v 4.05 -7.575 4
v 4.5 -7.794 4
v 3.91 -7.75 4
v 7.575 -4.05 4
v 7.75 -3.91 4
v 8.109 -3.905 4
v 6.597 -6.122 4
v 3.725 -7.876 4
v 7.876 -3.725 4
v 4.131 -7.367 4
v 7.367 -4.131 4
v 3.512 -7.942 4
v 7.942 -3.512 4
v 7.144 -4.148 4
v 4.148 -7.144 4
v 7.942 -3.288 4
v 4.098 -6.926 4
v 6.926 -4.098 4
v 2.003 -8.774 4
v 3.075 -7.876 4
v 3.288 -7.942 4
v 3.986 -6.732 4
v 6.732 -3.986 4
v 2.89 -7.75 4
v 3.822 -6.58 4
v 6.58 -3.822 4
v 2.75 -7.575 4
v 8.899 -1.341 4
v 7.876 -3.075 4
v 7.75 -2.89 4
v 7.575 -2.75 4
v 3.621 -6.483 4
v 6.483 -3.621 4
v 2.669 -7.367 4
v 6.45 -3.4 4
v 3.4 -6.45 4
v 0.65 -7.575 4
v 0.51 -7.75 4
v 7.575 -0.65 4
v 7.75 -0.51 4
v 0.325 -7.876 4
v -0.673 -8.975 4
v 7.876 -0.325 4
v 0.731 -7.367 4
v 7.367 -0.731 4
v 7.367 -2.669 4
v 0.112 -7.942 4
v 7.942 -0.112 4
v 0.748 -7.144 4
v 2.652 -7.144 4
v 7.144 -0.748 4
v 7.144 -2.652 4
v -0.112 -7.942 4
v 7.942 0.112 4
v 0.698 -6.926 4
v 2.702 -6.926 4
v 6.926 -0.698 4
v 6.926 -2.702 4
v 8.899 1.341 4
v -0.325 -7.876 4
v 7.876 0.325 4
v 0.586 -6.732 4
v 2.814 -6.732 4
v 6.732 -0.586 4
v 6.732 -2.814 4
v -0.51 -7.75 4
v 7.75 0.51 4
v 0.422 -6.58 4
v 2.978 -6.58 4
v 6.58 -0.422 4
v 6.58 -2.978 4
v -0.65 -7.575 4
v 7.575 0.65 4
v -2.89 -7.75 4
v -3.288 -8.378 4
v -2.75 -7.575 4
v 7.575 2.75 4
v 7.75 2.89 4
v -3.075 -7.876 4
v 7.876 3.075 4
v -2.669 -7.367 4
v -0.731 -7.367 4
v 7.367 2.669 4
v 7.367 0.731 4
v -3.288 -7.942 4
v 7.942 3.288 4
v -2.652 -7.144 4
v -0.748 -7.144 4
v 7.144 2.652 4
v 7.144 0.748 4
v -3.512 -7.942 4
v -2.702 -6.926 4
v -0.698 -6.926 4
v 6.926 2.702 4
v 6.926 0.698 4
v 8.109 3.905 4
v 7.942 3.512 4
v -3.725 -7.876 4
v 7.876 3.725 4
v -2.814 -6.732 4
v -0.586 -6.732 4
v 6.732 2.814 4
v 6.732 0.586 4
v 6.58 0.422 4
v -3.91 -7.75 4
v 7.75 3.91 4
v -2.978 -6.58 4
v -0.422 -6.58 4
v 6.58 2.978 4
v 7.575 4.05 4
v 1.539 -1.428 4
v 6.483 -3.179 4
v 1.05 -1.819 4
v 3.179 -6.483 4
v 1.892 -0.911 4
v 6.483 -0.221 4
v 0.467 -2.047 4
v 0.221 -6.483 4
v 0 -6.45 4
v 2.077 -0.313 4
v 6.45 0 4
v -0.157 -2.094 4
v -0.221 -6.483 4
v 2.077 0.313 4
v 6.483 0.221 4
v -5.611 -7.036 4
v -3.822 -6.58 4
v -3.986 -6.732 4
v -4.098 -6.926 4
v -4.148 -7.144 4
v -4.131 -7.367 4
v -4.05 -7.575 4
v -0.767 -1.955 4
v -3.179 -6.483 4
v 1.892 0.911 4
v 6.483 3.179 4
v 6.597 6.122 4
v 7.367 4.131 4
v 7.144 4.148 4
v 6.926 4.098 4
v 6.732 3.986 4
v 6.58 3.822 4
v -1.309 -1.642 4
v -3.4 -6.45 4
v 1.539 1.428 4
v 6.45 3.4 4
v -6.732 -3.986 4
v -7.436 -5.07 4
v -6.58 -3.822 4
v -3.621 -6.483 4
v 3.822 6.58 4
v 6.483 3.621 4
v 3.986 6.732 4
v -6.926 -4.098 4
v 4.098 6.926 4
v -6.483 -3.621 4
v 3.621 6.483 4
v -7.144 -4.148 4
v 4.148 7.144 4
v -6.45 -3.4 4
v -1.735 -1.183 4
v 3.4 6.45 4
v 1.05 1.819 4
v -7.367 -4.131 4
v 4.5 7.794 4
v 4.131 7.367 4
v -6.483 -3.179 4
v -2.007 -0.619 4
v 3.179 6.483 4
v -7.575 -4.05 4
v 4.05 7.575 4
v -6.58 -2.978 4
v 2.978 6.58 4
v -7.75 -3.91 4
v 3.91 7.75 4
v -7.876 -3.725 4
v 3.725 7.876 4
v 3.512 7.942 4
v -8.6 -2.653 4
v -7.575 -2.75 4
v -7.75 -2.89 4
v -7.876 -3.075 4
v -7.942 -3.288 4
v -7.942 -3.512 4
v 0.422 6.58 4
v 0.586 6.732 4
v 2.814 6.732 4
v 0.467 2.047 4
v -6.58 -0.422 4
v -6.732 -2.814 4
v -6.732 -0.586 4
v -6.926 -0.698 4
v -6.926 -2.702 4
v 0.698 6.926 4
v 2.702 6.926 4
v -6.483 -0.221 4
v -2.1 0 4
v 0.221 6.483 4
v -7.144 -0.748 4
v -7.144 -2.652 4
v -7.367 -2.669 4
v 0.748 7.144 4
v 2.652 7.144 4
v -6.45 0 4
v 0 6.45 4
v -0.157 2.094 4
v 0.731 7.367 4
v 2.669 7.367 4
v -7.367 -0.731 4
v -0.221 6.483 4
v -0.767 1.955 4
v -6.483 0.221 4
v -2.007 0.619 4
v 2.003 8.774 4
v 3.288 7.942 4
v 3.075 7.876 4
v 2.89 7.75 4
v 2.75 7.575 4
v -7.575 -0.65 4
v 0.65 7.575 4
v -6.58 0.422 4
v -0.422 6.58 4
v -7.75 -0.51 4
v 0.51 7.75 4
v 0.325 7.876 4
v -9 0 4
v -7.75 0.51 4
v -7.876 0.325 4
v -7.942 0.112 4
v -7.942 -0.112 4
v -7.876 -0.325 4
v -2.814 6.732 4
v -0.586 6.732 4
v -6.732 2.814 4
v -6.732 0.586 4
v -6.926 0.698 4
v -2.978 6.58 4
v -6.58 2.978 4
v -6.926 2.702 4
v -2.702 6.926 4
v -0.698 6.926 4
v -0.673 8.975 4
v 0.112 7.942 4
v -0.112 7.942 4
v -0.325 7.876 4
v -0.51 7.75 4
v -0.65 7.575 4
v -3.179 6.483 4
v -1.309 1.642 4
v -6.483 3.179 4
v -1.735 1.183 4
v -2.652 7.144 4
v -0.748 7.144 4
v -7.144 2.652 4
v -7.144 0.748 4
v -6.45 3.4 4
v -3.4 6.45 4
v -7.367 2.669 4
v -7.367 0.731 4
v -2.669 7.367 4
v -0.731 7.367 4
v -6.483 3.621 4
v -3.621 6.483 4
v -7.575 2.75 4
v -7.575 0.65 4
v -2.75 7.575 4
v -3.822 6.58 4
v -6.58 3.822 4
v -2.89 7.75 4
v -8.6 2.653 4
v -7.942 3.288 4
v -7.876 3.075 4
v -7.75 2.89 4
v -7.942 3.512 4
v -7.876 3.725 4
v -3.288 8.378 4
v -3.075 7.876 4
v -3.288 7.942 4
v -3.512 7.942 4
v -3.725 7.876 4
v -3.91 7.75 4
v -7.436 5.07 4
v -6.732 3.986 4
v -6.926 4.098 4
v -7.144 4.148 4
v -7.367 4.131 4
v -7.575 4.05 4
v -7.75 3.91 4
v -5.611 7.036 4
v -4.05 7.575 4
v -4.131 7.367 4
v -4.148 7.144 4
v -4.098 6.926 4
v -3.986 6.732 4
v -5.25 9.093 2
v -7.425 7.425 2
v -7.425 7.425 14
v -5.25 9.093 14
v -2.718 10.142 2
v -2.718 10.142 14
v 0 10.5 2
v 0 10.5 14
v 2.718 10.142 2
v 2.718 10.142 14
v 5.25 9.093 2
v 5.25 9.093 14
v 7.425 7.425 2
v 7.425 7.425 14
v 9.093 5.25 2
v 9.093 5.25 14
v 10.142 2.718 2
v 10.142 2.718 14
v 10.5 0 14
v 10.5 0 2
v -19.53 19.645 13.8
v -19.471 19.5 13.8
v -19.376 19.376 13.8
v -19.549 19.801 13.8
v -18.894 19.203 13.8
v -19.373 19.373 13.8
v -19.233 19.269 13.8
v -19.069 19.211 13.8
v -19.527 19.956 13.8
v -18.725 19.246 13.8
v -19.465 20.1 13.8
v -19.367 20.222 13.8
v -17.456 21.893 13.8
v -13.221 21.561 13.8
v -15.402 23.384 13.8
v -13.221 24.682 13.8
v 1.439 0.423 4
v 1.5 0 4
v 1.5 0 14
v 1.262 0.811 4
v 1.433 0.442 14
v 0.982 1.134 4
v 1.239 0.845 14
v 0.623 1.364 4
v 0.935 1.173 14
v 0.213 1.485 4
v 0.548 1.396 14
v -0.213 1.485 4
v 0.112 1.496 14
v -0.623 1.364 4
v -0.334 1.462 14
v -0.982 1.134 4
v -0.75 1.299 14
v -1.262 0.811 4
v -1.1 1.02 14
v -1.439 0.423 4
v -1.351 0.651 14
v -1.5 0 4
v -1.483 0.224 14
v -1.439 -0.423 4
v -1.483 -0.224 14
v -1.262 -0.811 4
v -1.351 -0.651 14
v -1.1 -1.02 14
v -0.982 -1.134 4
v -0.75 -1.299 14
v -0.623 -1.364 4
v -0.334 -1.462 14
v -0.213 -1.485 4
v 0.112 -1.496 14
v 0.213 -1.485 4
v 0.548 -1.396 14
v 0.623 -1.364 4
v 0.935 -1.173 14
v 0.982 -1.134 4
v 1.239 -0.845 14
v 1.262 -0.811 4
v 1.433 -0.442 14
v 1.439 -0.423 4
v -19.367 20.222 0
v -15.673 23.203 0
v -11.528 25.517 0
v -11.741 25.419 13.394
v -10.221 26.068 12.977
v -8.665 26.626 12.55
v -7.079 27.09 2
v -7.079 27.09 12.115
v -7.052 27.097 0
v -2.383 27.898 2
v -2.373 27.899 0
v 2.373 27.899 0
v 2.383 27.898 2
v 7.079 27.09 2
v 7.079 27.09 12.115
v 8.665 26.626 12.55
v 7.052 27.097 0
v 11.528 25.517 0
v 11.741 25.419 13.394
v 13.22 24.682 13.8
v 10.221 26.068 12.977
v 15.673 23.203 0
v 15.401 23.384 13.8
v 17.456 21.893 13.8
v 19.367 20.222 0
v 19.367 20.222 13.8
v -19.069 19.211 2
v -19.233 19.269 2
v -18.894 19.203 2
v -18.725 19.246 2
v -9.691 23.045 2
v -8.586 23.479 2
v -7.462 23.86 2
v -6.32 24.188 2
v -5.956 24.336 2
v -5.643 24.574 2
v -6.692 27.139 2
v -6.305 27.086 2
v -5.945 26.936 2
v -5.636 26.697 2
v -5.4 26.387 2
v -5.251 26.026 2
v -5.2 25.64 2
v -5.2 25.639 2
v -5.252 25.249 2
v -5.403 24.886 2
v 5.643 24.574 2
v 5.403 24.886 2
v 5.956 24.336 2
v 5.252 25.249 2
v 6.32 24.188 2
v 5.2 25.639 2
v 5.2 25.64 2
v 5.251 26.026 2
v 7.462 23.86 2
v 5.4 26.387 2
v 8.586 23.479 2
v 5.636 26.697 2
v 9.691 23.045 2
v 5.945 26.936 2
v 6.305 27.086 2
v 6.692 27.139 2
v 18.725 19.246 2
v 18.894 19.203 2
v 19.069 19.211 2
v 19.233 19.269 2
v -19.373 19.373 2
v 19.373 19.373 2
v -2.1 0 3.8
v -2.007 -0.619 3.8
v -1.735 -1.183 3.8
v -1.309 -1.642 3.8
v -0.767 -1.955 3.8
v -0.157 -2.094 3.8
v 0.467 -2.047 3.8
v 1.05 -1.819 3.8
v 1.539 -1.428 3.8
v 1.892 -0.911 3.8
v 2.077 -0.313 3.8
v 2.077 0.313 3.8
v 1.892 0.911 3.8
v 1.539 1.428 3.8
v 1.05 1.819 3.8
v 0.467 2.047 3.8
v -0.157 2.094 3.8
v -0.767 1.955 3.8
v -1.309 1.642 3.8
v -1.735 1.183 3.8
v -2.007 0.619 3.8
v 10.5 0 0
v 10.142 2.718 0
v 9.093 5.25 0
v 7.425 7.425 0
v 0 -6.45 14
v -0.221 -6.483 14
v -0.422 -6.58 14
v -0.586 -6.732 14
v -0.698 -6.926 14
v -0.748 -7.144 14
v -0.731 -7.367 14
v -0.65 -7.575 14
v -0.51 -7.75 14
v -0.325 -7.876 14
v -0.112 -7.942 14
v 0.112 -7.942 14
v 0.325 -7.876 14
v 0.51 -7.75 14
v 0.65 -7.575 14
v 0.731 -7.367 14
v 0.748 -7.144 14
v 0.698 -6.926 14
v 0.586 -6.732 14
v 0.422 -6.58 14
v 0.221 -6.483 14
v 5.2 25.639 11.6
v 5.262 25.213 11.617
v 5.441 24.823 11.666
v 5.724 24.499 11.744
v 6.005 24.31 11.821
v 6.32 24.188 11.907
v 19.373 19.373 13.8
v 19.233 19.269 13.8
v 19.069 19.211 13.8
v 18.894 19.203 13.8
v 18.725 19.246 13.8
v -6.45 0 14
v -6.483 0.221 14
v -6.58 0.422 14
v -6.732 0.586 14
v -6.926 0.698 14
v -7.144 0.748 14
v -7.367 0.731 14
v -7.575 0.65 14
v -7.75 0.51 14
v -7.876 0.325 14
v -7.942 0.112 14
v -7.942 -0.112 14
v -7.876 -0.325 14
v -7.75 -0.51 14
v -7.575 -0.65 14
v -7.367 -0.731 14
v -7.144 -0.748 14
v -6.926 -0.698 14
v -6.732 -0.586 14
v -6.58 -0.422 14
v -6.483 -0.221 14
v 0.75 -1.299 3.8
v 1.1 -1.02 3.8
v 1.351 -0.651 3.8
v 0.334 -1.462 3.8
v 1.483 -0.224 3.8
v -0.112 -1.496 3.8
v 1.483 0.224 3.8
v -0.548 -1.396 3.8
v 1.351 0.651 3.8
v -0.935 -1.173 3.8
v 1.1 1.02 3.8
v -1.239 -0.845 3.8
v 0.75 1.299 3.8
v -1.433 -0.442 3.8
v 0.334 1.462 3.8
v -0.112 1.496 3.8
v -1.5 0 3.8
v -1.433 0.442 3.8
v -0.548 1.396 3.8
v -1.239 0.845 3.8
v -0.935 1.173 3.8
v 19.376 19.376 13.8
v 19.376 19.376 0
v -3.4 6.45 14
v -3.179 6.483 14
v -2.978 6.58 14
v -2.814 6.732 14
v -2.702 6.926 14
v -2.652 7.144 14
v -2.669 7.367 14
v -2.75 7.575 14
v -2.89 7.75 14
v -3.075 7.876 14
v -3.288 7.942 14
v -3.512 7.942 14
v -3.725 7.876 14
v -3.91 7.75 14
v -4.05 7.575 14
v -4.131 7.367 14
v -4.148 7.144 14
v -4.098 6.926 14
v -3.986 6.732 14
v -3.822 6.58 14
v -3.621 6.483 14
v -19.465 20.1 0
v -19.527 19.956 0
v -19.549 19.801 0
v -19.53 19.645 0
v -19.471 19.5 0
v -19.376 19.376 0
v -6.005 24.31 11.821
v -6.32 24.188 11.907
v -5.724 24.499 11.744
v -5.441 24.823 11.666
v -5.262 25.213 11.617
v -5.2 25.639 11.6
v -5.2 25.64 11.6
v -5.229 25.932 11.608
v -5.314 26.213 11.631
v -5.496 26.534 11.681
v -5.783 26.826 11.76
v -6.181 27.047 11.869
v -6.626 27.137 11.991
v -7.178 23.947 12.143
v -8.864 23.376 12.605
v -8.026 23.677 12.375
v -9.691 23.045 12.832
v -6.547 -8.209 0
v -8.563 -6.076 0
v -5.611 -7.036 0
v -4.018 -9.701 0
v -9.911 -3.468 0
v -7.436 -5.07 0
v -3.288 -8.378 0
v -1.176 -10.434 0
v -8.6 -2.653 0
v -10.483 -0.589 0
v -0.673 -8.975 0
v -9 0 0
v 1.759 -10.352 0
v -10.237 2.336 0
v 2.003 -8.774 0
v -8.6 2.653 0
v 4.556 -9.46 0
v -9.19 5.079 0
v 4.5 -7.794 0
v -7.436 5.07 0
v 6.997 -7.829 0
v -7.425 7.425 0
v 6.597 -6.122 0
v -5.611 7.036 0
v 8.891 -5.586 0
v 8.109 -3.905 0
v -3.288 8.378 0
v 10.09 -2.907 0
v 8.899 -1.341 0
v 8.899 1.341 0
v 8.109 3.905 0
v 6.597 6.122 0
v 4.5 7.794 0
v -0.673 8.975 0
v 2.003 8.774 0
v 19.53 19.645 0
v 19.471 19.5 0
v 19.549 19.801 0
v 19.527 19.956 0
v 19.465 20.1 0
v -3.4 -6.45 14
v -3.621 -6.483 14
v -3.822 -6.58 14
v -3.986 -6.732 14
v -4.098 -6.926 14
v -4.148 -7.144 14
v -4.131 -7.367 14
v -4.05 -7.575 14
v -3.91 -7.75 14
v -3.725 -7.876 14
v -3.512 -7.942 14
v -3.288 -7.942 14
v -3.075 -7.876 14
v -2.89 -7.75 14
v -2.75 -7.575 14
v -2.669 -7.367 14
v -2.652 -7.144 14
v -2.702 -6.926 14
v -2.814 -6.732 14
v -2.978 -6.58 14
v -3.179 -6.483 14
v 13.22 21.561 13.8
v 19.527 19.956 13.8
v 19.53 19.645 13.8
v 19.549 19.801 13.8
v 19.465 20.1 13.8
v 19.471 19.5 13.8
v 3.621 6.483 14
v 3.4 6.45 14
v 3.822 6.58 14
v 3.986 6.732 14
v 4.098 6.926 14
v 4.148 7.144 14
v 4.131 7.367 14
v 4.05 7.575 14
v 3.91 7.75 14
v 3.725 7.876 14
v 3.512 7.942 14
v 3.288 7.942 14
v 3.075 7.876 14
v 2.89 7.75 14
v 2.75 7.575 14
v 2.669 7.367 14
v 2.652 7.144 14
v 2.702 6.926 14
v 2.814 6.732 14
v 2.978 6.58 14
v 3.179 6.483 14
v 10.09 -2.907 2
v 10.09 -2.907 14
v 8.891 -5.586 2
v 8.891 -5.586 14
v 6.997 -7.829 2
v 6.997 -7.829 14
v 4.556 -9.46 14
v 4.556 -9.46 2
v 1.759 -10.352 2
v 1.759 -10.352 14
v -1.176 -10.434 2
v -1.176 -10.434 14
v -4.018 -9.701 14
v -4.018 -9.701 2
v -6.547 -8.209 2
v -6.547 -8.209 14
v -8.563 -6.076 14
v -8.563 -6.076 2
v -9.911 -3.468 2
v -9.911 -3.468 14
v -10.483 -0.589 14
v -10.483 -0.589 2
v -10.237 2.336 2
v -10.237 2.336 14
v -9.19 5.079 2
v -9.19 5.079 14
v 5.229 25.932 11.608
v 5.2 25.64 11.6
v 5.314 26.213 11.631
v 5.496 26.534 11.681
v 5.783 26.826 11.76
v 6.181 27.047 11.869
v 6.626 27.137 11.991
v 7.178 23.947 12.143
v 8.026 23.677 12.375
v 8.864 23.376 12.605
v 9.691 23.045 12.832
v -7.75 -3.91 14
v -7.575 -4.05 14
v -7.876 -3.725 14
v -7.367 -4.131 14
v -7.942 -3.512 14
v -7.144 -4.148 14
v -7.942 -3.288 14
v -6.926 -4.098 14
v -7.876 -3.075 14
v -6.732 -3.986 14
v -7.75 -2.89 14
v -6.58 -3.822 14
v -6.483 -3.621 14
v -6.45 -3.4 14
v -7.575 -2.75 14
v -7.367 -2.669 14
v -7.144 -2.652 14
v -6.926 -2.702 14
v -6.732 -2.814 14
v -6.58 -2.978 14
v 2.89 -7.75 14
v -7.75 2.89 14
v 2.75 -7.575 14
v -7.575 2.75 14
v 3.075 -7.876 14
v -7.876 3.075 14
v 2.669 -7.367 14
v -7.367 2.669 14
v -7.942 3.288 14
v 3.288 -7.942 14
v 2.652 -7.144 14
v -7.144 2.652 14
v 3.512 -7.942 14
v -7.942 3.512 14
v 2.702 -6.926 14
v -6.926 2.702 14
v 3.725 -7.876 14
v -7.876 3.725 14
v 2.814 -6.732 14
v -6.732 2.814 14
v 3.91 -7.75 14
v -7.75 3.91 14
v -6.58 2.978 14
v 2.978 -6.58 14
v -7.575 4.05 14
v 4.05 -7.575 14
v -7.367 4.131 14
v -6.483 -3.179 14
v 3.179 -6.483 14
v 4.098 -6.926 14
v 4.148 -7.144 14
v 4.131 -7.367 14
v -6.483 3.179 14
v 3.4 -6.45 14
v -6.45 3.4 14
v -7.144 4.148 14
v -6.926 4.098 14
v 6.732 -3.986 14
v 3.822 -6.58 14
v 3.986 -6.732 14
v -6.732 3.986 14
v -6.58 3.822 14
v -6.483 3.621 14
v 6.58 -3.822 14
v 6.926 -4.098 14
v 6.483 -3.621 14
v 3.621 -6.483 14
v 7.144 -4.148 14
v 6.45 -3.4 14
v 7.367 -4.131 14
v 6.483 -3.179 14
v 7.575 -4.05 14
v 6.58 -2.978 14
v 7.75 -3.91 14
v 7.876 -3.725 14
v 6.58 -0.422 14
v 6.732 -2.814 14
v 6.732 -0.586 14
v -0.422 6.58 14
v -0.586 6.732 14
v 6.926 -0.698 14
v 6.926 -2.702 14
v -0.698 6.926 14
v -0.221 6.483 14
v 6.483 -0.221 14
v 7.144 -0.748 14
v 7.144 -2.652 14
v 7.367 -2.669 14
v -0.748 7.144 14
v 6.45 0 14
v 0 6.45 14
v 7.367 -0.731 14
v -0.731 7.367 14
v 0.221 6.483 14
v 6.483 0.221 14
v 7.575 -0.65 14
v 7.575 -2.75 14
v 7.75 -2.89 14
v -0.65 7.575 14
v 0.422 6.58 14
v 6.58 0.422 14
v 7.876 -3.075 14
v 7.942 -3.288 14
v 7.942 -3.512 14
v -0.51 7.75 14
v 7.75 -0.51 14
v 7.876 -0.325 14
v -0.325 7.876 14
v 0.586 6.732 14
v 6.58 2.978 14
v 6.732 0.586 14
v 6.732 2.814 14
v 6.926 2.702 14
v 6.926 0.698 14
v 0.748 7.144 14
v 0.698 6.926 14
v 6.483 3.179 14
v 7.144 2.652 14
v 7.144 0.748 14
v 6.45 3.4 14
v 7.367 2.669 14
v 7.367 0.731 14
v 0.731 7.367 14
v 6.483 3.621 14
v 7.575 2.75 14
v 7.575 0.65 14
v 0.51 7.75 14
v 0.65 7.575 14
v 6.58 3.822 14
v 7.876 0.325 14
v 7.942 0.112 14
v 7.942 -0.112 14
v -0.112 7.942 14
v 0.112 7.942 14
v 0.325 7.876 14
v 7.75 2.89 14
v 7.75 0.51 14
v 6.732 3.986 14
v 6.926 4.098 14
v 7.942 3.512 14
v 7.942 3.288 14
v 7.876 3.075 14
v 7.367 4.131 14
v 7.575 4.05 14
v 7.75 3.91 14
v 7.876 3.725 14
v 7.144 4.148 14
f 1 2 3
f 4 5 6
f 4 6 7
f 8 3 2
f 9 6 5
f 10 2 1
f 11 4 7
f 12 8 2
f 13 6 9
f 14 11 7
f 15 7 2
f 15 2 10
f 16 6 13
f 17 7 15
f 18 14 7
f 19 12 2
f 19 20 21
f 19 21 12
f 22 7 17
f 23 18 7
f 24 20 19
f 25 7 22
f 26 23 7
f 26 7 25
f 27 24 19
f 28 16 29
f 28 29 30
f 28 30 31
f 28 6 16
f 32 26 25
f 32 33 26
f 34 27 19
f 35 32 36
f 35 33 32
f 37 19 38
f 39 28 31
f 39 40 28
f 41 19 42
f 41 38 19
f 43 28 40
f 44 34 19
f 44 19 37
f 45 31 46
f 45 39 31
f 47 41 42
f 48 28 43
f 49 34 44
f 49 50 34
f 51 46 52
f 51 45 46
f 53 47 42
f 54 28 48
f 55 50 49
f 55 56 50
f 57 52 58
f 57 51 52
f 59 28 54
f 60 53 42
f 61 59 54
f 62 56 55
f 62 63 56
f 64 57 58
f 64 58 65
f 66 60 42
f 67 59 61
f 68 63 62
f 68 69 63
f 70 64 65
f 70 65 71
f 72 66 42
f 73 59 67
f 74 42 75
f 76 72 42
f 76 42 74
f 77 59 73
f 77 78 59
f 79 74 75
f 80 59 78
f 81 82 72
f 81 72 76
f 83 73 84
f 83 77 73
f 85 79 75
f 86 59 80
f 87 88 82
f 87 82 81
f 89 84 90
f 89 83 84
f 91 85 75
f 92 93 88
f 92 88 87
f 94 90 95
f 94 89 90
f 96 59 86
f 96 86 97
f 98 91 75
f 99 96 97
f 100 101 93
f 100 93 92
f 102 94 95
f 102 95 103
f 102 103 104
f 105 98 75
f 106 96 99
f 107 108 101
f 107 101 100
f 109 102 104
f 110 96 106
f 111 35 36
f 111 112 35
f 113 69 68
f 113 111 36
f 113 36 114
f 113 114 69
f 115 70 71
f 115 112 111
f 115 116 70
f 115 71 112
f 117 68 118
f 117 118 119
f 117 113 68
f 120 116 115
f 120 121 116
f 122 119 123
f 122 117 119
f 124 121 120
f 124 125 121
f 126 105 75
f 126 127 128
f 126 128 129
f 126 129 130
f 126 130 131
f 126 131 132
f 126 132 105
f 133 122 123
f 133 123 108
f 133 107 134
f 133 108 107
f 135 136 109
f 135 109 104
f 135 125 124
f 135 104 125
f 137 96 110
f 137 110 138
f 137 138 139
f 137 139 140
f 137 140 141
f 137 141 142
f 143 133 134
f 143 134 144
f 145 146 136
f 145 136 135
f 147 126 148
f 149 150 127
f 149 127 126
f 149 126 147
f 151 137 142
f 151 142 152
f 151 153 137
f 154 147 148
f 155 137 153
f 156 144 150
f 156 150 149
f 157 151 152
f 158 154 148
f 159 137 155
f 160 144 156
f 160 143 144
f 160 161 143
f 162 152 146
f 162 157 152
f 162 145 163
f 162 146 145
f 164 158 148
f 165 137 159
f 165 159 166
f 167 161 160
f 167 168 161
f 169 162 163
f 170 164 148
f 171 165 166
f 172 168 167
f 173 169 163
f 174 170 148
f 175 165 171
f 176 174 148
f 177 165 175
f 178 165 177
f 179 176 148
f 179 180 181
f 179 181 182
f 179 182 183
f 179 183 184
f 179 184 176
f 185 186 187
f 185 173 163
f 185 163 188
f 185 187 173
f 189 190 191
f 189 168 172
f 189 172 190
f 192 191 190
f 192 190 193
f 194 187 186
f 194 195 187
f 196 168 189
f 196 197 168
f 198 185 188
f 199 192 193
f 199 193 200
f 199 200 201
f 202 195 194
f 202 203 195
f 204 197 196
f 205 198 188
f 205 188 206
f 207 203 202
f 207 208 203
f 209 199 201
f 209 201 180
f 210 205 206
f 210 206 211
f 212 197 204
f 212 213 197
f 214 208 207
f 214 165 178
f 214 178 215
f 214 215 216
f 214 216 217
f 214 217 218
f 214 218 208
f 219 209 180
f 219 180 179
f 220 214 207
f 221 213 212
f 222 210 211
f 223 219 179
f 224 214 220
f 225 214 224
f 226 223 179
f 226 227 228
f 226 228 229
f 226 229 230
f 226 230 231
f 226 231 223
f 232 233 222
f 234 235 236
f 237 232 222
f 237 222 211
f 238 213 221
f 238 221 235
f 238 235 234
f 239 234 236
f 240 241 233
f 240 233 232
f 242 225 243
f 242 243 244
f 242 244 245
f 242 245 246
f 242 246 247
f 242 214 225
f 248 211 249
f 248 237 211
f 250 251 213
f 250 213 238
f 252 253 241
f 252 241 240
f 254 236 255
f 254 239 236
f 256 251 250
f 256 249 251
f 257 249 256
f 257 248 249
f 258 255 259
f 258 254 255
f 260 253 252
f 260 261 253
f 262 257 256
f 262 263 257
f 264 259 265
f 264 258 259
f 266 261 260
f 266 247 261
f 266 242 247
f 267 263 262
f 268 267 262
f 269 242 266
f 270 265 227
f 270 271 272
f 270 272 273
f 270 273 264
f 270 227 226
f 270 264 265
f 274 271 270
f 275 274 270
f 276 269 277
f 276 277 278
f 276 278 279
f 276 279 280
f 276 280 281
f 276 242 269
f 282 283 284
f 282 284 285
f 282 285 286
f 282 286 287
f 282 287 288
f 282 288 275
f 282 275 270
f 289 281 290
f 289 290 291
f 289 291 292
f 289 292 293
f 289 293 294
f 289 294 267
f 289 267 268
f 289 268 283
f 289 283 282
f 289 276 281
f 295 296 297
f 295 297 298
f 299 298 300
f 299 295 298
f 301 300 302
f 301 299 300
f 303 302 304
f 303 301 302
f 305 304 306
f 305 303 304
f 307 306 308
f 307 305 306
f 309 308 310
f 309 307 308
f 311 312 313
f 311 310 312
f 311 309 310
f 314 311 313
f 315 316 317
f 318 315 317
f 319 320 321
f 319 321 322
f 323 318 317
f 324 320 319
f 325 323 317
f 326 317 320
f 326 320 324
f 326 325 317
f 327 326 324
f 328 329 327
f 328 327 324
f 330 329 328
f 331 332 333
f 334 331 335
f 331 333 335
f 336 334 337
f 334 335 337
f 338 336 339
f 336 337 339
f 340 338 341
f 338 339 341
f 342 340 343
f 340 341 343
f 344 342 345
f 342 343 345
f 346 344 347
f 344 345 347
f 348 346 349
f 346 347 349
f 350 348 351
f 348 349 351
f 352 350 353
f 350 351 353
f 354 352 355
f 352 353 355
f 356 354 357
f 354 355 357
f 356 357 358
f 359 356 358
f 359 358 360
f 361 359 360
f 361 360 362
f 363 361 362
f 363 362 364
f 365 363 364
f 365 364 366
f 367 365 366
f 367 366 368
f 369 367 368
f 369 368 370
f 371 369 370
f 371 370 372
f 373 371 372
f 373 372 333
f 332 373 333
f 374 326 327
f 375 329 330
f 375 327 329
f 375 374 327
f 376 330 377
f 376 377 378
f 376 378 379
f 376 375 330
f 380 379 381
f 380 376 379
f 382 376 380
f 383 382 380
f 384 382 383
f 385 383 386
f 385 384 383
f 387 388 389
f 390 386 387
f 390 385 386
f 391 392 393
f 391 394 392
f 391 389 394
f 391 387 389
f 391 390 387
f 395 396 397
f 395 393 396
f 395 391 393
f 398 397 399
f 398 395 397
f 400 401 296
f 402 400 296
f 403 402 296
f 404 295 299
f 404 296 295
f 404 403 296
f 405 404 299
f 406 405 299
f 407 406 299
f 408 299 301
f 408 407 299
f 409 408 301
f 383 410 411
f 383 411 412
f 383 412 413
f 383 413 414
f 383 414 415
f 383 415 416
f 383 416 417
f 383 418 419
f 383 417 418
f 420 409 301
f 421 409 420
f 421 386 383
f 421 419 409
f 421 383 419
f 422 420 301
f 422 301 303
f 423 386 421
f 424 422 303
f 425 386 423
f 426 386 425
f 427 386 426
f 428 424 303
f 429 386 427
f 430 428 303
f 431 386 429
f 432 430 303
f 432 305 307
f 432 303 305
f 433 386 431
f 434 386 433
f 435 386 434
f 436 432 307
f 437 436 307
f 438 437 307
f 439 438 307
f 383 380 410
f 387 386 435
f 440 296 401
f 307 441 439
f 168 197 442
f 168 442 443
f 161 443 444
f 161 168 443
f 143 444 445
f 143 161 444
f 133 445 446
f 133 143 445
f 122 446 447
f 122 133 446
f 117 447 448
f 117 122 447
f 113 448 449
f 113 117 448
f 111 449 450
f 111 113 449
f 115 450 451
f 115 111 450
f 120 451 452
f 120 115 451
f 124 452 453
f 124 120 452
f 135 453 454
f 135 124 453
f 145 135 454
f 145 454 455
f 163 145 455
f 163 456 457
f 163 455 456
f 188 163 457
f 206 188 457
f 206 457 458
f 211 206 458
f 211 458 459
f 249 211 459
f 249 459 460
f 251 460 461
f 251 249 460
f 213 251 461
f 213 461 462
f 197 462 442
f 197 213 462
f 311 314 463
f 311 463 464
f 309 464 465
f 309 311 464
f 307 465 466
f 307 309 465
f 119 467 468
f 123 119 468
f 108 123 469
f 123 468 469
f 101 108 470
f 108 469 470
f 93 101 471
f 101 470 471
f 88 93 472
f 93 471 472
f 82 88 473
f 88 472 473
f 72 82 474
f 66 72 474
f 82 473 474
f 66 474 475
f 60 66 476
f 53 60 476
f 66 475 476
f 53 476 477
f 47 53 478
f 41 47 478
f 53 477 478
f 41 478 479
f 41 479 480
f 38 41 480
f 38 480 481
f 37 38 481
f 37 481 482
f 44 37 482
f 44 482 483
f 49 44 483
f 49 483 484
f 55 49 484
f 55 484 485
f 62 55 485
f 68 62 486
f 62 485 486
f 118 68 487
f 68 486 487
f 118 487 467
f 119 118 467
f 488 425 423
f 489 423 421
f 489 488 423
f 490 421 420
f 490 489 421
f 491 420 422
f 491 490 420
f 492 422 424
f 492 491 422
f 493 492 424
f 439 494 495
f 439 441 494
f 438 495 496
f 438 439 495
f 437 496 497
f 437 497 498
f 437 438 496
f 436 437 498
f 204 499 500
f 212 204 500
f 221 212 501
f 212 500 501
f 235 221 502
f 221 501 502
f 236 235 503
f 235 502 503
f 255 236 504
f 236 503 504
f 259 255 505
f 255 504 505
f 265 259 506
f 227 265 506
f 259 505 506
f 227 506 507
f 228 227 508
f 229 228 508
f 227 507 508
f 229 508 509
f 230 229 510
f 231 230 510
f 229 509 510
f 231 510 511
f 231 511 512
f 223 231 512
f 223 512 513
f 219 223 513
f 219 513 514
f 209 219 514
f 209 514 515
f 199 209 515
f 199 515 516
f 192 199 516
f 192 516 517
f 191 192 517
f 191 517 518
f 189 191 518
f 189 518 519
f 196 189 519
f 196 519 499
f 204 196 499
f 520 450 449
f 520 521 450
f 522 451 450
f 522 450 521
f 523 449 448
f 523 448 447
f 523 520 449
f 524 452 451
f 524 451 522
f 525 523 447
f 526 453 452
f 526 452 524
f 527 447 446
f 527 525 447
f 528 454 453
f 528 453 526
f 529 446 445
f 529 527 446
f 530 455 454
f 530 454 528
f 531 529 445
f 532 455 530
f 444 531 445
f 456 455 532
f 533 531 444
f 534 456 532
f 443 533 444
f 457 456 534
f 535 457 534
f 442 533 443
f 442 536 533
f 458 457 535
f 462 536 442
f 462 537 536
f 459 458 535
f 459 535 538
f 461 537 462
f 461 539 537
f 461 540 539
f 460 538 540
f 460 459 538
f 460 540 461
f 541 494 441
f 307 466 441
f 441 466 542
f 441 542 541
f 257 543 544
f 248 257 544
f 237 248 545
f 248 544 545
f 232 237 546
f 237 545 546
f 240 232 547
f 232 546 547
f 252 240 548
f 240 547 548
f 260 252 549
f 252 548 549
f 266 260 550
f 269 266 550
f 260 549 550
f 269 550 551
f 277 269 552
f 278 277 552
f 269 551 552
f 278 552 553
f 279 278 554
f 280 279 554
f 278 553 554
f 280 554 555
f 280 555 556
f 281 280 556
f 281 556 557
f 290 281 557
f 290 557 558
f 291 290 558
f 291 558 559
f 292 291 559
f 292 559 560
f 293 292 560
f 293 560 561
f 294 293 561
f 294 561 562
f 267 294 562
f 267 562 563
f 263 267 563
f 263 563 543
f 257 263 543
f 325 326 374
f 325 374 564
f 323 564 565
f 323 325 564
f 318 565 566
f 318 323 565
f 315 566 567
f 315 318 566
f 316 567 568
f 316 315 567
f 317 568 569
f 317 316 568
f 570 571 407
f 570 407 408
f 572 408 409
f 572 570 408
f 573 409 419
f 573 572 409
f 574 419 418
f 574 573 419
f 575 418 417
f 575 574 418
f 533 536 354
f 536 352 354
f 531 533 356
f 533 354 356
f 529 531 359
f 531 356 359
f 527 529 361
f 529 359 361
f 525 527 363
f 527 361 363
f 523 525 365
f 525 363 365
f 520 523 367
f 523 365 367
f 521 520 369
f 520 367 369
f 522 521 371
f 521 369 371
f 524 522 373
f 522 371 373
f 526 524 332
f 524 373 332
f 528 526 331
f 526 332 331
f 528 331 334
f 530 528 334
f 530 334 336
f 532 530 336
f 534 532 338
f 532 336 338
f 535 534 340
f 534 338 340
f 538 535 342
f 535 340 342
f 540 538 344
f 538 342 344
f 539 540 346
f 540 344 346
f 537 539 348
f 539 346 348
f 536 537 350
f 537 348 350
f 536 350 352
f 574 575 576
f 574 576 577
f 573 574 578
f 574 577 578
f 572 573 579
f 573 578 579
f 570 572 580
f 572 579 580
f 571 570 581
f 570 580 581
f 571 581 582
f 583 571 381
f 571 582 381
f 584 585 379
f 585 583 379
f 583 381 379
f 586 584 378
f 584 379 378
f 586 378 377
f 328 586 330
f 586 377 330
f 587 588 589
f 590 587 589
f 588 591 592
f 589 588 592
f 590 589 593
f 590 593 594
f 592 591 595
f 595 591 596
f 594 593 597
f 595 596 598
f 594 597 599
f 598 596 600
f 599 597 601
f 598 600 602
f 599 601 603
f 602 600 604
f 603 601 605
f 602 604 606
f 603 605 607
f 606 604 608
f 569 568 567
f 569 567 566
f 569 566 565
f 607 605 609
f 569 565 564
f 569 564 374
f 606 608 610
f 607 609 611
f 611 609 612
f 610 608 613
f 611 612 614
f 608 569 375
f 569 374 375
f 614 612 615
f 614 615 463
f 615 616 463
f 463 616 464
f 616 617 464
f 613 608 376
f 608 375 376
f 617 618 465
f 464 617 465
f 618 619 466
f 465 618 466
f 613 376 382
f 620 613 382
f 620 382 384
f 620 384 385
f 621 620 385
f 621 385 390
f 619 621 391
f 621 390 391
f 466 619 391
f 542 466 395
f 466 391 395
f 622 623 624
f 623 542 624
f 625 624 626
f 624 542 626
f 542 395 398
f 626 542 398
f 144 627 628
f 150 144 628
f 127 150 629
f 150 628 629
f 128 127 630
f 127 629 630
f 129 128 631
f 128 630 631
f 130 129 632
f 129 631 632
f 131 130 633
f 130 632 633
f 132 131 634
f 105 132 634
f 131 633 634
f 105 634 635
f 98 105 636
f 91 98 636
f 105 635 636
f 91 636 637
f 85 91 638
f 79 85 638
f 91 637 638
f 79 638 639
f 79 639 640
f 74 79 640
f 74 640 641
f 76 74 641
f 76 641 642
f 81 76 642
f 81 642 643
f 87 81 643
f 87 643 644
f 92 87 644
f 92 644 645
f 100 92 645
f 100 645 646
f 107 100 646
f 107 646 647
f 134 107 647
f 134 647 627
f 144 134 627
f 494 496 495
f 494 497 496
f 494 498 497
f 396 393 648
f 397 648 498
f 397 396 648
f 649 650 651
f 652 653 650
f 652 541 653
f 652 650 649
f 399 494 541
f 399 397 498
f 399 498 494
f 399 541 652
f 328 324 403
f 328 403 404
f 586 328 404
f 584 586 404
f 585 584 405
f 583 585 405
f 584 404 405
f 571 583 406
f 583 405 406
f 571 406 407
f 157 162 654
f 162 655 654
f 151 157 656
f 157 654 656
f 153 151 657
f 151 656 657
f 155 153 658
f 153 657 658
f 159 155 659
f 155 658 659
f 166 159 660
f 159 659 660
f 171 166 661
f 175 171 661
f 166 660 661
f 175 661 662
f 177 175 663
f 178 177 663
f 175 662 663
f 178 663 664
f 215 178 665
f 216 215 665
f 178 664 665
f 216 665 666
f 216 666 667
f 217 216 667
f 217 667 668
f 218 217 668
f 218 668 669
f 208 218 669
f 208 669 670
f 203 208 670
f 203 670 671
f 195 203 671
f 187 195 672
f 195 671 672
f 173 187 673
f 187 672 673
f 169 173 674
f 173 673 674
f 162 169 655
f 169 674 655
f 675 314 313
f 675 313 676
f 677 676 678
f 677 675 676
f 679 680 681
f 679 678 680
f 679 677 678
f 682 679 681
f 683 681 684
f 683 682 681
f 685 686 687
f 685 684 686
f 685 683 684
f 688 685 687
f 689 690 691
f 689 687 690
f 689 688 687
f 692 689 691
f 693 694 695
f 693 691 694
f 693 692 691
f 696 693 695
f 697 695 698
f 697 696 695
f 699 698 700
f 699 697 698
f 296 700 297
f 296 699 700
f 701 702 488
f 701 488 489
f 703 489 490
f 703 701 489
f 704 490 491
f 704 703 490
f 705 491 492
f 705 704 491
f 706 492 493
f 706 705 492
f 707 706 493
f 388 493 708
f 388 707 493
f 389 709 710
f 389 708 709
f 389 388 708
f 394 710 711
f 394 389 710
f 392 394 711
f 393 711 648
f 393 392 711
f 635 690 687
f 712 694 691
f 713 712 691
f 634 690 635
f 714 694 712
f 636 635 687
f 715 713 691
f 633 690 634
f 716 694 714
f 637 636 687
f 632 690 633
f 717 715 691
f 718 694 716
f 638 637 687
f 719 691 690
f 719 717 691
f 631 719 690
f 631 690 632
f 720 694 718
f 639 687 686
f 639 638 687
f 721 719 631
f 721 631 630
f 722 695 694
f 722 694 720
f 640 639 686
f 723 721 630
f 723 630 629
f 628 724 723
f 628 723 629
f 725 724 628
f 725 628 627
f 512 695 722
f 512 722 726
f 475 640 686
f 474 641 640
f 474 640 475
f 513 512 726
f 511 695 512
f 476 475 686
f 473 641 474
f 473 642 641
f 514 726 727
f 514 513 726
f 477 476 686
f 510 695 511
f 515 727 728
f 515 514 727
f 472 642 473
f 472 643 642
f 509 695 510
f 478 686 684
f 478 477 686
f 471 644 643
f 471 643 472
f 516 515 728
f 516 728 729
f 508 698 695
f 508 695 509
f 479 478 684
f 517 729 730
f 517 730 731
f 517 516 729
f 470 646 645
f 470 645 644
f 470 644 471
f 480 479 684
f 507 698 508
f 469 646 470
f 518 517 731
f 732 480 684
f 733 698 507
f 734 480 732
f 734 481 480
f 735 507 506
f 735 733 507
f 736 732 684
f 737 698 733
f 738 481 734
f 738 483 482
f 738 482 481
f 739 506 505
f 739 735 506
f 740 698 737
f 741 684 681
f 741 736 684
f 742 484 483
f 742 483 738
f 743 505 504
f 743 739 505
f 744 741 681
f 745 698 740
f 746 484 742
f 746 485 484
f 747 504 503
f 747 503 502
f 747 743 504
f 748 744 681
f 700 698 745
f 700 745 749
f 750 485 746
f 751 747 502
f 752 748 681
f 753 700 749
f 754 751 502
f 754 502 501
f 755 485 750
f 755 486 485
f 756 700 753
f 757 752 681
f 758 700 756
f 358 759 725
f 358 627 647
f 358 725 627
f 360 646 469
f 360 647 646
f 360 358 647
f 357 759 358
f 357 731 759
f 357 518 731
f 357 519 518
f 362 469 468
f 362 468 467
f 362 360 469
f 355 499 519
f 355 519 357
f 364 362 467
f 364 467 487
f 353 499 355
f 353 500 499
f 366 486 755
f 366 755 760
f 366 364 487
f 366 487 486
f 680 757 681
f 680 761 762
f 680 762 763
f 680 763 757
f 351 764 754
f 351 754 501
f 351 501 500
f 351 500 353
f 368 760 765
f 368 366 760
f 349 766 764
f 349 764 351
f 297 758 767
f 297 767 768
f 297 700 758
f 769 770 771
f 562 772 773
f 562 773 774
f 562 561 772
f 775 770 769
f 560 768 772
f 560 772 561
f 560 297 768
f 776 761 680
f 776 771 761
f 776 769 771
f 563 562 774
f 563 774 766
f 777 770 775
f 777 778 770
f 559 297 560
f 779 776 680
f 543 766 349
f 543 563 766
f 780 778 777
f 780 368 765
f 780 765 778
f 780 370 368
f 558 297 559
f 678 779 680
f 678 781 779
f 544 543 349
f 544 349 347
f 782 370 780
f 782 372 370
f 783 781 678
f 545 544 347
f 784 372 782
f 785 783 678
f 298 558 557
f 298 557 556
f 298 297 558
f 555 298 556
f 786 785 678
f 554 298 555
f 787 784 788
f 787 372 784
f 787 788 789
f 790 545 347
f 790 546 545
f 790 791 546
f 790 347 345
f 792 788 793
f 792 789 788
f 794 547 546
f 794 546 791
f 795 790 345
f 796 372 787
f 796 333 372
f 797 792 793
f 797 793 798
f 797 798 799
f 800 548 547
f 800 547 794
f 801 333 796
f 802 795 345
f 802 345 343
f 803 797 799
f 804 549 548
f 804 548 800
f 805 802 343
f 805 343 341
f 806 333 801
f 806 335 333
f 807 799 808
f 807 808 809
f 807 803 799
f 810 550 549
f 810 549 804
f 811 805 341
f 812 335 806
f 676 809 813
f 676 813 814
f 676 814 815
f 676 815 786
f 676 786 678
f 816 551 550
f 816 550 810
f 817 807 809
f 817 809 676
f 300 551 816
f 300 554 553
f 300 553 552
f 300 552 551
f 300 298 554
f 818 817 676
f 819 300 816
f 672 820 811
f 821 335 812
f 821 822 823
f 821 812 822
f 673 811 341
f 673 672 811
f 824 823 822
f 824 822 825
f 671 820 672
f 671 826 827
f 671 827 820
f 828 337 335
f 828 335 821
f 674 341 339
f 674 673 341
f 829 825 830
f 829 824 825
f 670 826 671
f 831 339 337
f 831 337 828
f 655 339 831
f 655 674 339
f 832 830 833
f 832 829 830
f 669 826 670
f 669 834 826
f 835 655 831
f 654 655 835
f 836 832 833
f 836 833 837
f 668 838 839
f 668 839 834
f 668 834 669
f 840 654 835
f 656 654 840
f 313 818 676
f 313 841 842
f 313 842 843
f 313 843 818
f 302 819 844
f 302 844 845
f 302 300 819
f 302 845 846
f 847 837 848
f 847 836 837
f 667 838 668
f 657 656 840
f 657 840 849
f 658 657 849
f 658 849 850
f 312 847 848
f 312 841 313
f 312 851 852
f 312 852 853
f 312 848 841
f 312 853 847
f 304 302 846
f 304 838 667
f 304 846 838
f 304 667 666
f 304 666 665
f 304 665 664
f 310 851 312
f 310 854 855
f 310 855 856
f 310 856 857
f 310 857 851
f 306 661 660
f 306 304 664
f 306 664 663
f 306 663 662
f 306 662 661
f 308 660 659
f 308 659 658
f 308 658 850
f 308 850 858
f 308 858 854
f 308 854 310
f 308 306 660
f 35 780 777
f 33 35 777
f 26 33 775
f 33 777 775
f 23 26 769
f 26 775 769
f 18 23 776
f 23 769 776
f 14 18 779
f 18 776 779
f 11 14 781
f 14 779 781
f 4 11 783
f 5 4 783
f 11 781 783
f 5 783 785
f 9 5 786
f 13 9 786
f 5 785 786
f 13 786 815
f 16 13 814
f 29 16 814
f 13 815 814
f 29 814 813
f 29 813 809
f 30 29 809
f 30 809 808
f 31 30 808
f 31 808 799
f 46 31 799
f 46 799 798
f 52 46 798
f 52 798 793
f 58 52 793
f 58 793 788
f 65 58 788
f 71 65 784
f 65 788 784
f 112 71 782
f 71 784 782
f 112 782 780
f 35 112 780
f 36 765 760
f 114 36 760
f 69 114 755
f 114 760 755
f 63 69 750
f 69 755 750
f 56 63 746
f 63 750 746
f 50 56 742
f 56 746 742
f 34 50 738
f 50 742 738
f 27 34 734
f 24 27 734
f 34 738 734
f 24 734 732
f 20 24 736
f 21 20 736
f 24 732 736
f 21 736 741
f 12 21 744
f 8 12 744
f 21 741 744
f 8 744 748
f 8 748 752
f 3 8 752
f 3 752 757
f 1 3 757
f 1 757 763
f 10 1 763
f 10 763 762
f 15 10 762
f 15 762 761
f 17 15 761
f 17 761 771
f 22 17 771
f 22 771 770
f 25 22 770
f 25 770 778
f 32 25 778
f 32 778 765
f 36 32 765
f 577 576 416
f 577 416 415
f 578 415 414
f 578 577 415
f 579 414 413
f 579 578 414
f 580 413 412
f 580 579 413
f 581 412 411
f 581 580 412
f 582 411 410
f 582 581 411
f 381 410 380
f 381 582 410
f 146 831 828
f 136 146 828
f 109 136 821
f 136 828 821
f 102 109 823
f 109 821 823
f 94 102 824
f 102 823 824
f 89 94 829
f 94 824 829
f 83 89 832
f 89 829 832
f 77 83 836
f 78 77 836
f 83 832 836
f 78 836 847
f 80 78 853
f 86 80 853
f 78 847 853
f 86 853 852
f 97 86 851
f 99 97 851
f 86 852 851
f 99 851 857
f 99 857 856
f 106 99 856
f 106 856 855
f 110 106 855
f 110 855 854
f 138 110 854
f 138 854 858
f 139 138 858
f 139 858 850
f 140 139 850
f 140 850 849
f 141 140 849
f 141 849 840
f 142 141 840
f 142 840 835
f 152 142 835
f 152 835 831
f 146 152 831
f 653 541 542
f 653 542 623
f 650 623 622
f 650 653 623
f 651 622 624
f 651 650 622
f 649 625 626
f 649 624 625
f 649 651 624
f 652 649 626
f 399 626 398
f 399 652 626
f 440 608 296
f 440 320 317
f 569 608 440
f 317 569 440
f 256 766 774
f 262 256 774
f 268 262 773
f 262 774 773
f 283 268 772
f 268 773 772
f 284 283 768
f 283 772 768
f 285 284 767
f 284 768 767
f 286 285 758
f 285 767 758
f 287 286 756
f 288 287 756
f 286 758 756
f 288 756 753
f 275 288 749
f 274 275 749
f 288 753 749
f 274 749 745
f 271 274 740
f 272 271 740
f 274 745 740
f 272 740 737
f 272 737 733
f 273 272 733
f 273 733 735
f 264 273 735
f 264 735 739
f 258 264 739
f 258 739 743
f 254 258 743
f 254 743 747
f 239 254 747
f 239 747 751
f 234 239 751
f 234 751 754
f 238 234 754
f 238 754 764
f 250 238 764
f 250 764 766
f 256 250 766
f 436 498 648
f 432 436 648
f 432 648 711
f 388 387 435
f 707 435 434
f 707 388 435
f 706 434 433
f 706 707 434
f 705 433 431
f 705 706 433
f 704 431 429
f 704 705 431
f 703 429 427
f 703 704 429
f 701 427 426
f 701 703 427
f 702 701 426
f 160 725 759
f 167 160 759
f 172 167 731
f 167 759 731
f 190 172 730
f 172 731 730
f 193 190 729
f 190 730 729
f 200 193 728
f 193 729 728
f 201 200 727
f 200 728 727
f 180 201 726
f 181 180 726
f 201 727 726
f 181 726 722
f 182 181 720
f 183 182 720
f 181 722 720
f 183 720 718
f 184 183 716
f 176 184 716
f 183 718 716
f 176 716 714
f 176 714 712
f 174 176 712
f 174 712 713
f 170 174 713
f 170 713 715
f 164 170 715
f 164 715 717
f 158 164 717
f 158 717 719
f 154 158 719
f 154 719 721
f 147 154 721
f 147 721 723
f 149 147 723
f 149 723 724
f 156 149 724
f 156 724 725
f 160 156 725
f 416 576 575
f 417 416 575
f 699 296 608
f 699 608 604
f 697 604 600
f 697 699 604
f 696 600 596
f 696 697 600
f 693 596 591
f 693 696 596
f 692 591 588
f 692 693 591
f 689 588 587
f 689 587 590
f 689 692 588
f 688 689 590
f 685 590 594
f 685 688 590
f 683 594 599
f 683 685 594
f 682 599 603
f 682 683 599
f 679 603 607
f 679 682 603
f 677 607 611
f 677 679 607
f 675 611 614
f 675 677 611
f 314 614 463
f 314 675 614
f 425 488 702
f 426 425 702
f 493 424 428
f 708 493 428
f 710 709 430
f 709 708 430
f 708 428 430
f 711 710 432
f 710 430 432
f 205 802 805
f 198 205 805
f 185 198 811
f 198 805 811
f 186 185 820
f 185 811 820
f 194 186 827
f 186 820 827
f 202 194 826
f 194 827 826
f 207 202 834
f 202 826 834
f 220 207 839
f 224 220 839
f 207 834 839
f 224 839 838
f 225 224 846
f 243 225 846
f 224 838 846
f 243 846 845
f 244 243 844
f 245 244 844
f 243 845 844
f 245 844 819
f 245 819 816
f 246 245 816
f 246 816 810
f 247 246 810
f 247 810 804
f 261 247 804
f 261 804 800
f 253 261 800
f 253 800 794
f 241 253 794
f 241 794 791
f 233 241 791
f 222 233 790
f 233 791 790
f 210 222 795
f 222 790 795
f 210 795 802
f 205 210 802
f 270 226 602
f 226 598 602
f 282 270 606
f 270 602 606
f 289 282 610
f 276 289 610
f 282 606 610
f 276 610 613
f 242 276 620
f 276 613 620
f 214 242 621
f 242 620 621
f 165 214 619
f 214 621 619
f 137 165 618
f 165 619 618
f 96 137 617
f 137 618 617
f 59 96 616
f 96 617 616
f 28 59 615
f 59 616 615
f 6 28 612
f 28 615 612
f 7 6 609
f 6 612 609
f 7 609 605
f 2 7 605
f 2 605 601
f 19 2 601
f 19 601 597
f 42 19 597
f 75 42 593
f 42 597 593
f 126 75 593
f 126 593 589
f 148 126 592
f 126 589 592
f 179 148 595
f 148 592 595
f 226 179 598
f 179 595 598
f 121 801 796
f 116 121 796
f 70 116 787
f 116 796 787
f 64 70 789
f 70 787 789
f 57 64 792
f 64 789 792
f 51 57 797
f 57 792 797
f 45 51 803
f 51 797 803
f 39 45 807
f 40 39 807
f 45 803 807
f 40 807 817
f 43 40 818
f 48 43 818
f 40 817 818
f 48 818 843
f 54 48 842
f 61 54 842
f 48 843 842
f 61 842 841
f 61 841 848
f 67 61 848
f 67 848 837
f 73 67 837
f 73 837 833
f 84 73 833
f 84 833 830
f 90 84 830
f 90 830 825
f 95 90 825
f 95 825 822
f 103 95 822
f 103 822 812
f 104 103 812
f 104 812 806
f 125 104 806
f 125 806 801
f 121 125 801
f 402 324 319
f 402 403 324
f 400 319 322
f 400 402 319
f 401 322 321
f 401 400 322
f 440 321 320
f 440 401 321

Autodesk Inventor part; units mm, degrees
ref_plane "YZ Plane" through (0, 0, 0) normal (1, 0, 0) x (0, 1, 0)
ref_plane "XZ Plane" through (0, 0, 0) normal (0, 1, 0) x (-1, 0, 0)
ref_plane "XY Plane" through (0, 0, 0) normal (0, 0, 1) x (1, 0, 0)
sketch "Эскиз1" plane through (0, 0, 0) normal (0, 0, 1) x (1, 0, 0)
  circle A0 centre (0, 0) radius 30
  circle A1 centre (0, 0) radius 25
  circle A2 centre (0, 0) radius 28
  line L0 (0, 0) -> (28, 0) construction
  line L1 (0, 0) -> (28, 0) construction
  line L2 (0, 28) -> (-5.2, 28)
  line L3 (-5.2, 28) -> (-5.2, 24.4532)
  line L4 (0, 0) -> (19.799, 19.799)
  line L5 (0, 0) -> (28, 0) construction
  line L6 (-0.4901, 1.1812) -> (26.3238, 1.1812) construction
  line L7 (0, 0) -> (-19.799, 19.799)
  line L8 (0, 0) -> (28, 0) construction
  line L9 (-5.2, 24.4532) -> (5.2, 24.4532)
  line L10 (5.2, 24.4532) -> (5.2, 28)
  line L11 (5.2, 28) -> (0, 28)
  point P0 (4.9999, 24.4949)
  point P1 (-19.4504, 20.1415)
  point P2 (-5.2, 27.5129)
  dimension "d0" = 60
  dimension "d1" = 50
  dimension "d2" = 56
  dimension "d5" = 5.2
  dimension "d7" = 45
  dimension "d11" = 135
  dimension "d19" = 10.4
extrude "Выдавливание1" add sketch "Эскиз1" along normal blind 2 contours L9 A1 | L10 A2 L4 A1 | A1 L4 L7 L9 | A1 L3 A2 L10 | A1 L7 A2 L3
sketch "Эскиз2" plane through (0, 0, 2) normal (0, 0, 1) x (1, 0, 0)
  line L0 (-19.799, 19.799) -> (0, 0) projected
  circle A0 centre (0, 0) radius 25
  line L1 (-5.2, 28) -> (-5.2, 27.5129) projected
  circle A1 centre (0, 0) radius 28
  arc A2 (19.799, 19.799) -> (-19.799, 19.799) centre (0, 0) ccw projected
  line L2 (-5.2, 27.5129) -> (-5.2, 24.4532)
  line L3 (0, 0) -> (19.799, 19.799) projected
  line L4 (19.799, 19.799) -> (17.6777, 17.6777)
  line L5 (-19.799, 19.799) -> (-17.6777, 17.6777)
  line L6 (-5.2, 24.4532) -> (5.2, 24.4532)
  line L7 (5.2, 24.4532) -> (5.2, 27.5129)
  point P0 (4.9999, 24.4949)
  point P1 (4.9874, 27.5522)
  point P2 (0, 28)
  dimension "d20" = 10.4
extrude "Выдавливание2" add sketch "Эскиз2" along normal blind 11.8 contours A1 L2 A0 L0 | A1 L3 A0 L7
fillet "Сопряжение1" radius 1.5 4 edges at (5.2, 27.5129, 7.9) (5.2, 24.4532, 7.9) (-5.2, 27.5129, 7.9) (-5.2, 24.4532, 7.9)
sketch "Эскиз4" plane through (0, 0, 2) normal (0, 0, 1) x (1, 0, 0)
  line L0 (-17.6777, 17.6777) -> (0, 0) projected
  circle A0 centre (0, 0) radius 10.5
  dimension "d25" = 21
extrude "Выдавливание3" add sketch "Эскиз4" along normal blind 12 and the other way blind 2
sketch "Эскиз3" plane through (0, 0, 2) normal (0, 0, 1) x (1, 0, 0)
  line L0 (0, 28) -> (0, 29)
  line L1 (0, 29) -> (-5, 29)
  line L2 (-5, 29) -> (-5, 19)
  line L3 (-5, 19) -> (5, 19)
  line L4 (0, 29) -> (5, 29)
  line L5 (5, 29) -> (5, 19)
  line L6 (-1.7678, 18.2322) -> (-10, 10)
  line L7 (-19.799, 19.799) -> (-7.4246, 7.4246) projected
  line L8 (1.7678, 18.2322) -> (10, 10)
  line L9 (7.4246, 7.4246) -> (17.6777, 17.6777) projected
  line L10 (10, 10) -> (7.8787, 7.8787)
  circle A0 centre (0, 0) radius 11.1421
  line L11 (-10, 10) -> (-7.8787, 7.8787)
  arc A1 (1.7678, 18.2322) -> (-1.7678, 18.2322) centre (0, 16.4645) ccw
  line L12 (-10, 10) -> (-2.9289, 17.0711)
  line L13 (-2.9289, 17.0711) -> (-10, 24.1421)
  line L14 (-10, 24.1421) -> (-17.0711, 17.0711)
  line L15 (-10, 10) -> (-17.0711, 17.0711)
  line L16 (-7.4246, 7.4246) -> (0, 0)
  arc A2 (7.4246, 7.4246) -> (-7.4246, 7.4246) centre (0, 0) ccw projected
  line L17 (0, 0) -> (7.4246, 7.4246)
  circle A3 centre (0, 0) radius 28
  circle A4 centre (0, 0) radius 25
  line L18 (0, 11.1421) -> (0, 35.3553)
  line L19 (10, 10) -> (27.088, -7.088)
  line L20 (-10, 10) -> (-27.088, -7.088)
  line L21 (27.088, -7.088) -> (-27.088, -7.088)
  line L22 (-17.0711, 17.0711) -> (-21.6622, 12.4799)
  line L23 (-21.6622, 12.4799) -> (-27.1, 7.0422)
  line L24 (10, 10) -> (17.0711, 17.0711)
  line L25 (17.0711, 17.0711) -> (21.6622, 12.4799)
  line L26 (21.6622, 12.4799) -> (12.4799, 21.6622)
  arc A5 (17.6777, 17.6777) -> (6.3208, 24.1878) centre (0, 0) ccw projected
  dimension "d21" = 1
  dimension "d22" = 5
  dimension "d23" = 10
  dimension "d24" = 10
  dimension "d31" = 3
  dimension "d32" = 2.5
  dimension "d33" = 10
  dimension "d34" = 10
  dimension "d35" = 22.2843
  dimension "d36" = 16.4645
  dimension "d37" = 7.8223
  dimension "d38" = 10
sketch "Эскиз5" plane through (0, 0, 13.8) normal (0, 0, 1) x (1, 0, 0)
  line L0 (-19.799, 19.799) -> (-7.4246, 7.4246) projected
  line L1 (-19.799, 19.799) -> (-19.0919, 19.0919)
  line L2 (-19.0919, 19.0919) -> (-9.6913, 23.0452)
  arc A0 (-6.3208, 24.1878) -> (-17.6777, 17.6777) centre (0, 0) ccw projected
  line L3 (17.6777, 17.6777) -> (19.799, 19.799) projected
  line L4 (19.799, 19.799) -> (19.0919, 19.0919)
  line L5 (19.0919, 19.0919) -> (9.6913, 23.0452)
  arc A1 (17.6777, 17.6777) -> (6.3208, 24.1878) centre (0, 0) ccw projected
  line L6 (7.4246, 7.4246) -> (17.6777, 17.6777) projected
  line L7 (19.0919, 19.0919) -> (17.6777, 17.6777)
  line L8 (-19.0919, 19.0919) -> (-17.6777, 17.6777)
  circle A2 centre (0, 0) radius 25
  dimension "d39" = 1
  dimension "d40" = 1
extrude "Выдавливание4" cut sketch "Эскиз5" against normal blind 11.8 contours L2 A0 L0 | A1 L5 L3
fillet "Сопряжение2" radius 0.595 4 edges at (19.799, 19.799, 6.9) (19.0919, 19.0919, 7.9) (-19.799, 19.799, 6.9) (-19.0919, 19.0919, 7.9)
sketch "Эскиз6" plane through (0, 0, 14) normal (0, 0, 1) x (1, 0, 0)
  circle A0 centre (0, 0) radius 1.5
  dimension "d44" = 3
extrude "Выдавливание5" cut sketch "Эскиз6" against normal blind 14
sketch "Эскиз7" plane through (0, 0, 14) normal (0, 0, 1) x (1, 0, 0)
  circle A0 centre (0, 0) radius 1.5 projected
  line L0 (0, 0) -> (-7.2, 0)
  circle A1 centre (-7.2, 0) radius 0.75
  line L1 (-7.2, 0) -> (-7.2, 3.4)
  line L2 (-7.2, 3.4) -> (-7.2, -3.4)
  circle A2 centre (-7.2, 3.4) radius 0.75
  circle A3 centre (-7.2, -3.4) radius 0.75
  dimension "d47" = 7.2
  dimension "d48" = 1.5
  dimension "d49" = 3.4
  dimension "d50" = 6.8
  dimension "d51" = 1.5
  dimension "d52" = 1.5
extrude "Выдавливание6" cut sketch "Эскиз7" against normal blind 14 contours A3 | A2 | A1 L2 L0 | L0 L1 A1 | L2 A1 L1
pattern_circular "Круговой массив1" count 4 over 360 about axis through (0, 0, 14) along (0, 0, -1) of "Выдавливание6"
sketch "Эскиз8" plane through (0, 0, 0) normal (0, 0, -1) x (-1, 0, 0)
  circle A0 centre (0, 0) radius 1.5 projected
  circle A1 centre (0, 0) radius 1.5 projected
  circle A2 centre (0, 0) radius 9
  dimension "d61" = 18
extrude "Выдавливание7" cut sketch "Эскиз8" against normal blind 4
sketch "Эскиз12" plane through (0, 0, 13.8) normal (0, 0, 1) x (1, 0, 0)
  arc A0 (-7.0792, 27.0903) -> (-19.3619, 20.2267) centre (0, 0) ccw projected
  arc A1 (7.0792, 27.0903) -> (6.3208, 24.1878) centre (6.7, 25.639) ccw projected
  line L0 (-7.0792, 27.0903) -> (7.0792, 27.0903)
  line L1 (7.0792, 27.0903) -> (7.0792, 24.1878)
  line L2 (7.0792, 24.1878) -> (-7.0792, 24.1878)
  line L3 (-7.0792, 24.1878) -> (-7.0792, 27.0903)
extrude "Выдавливание8" add sketch "Эскиз12" along normal blind 11.8 contours L1 L2 A1 L0 | A1 L2 L3 L0
sketch "Эскиз13" plane through (-6.3208, 27.0903, 13.8) normal (0, 1, 0) x (1, 0, 0)
  line L0 (11.5208, 11.8) -> (11.5208, 0) projected
  line L1 (11.5208, 0) -> (11.5208, 2.2)
  line L2 (11.5208, 2.2) -> (19.5413, 0)
  line L3 (13.4, 0) -> (25.6826, 0) projected
  line L4 (11.5208, 0) -> (19.5413, 0)
  line L5 (12.6415, 0) -> (0, 0) projected
  line L6 (1.1208, 11.8) -> (1.1208, 0) projected
  line L7 (1.1208, 0) -> (1.1208, 2.2)
  line L8 (1.1208, 2.2) -> (-6.8998, 0)
  line L9 (-13.0411, 0) -> (-0.7585, 0) projected
  line L10 (1.1208, 0) -> (0, 0) projected
  line L11 (1.1208, 0) -> (-6.8998, 0)
  line L12 (-0.7585, 11.8) -> (-0.7585, 0) projected
  line L13 (13.4, -11.8) -> (-0.7585, -11.8) projected
  line L14 (-0.7585, 0) -> (-0.7585, -11.8)
  line L15 (-0.7585, -11.8) -> (13.4, -11.8)
  line L16 (13.4, 0) -> (13.4, -11.8) projected
  line L17 (13.4, -11.8) -> (13.4, 0)
  line L18 (13.4, 0) -> (-0.7585, 0)
  point P0 (6.3208, 13.8)
  dimension "d64" = 2.2
extrude "Выдавливание9" cut sketch "Эскиз13" against normal mid plane 11.8
sketch "Эскиз15" plane through (0, 0, 4) normal (0, 0, -1) x (-1, 0, 0)
  circle A0 centre (0, 0) radius 2.1
  circle A1 centre (0, 0) radius 1.5 projected
  dimension "d67" = 4.2
extrude "Выдавливание10" add sketch "Эскиз15" along normal blind 0.2
properties part number "pizza_disk"
